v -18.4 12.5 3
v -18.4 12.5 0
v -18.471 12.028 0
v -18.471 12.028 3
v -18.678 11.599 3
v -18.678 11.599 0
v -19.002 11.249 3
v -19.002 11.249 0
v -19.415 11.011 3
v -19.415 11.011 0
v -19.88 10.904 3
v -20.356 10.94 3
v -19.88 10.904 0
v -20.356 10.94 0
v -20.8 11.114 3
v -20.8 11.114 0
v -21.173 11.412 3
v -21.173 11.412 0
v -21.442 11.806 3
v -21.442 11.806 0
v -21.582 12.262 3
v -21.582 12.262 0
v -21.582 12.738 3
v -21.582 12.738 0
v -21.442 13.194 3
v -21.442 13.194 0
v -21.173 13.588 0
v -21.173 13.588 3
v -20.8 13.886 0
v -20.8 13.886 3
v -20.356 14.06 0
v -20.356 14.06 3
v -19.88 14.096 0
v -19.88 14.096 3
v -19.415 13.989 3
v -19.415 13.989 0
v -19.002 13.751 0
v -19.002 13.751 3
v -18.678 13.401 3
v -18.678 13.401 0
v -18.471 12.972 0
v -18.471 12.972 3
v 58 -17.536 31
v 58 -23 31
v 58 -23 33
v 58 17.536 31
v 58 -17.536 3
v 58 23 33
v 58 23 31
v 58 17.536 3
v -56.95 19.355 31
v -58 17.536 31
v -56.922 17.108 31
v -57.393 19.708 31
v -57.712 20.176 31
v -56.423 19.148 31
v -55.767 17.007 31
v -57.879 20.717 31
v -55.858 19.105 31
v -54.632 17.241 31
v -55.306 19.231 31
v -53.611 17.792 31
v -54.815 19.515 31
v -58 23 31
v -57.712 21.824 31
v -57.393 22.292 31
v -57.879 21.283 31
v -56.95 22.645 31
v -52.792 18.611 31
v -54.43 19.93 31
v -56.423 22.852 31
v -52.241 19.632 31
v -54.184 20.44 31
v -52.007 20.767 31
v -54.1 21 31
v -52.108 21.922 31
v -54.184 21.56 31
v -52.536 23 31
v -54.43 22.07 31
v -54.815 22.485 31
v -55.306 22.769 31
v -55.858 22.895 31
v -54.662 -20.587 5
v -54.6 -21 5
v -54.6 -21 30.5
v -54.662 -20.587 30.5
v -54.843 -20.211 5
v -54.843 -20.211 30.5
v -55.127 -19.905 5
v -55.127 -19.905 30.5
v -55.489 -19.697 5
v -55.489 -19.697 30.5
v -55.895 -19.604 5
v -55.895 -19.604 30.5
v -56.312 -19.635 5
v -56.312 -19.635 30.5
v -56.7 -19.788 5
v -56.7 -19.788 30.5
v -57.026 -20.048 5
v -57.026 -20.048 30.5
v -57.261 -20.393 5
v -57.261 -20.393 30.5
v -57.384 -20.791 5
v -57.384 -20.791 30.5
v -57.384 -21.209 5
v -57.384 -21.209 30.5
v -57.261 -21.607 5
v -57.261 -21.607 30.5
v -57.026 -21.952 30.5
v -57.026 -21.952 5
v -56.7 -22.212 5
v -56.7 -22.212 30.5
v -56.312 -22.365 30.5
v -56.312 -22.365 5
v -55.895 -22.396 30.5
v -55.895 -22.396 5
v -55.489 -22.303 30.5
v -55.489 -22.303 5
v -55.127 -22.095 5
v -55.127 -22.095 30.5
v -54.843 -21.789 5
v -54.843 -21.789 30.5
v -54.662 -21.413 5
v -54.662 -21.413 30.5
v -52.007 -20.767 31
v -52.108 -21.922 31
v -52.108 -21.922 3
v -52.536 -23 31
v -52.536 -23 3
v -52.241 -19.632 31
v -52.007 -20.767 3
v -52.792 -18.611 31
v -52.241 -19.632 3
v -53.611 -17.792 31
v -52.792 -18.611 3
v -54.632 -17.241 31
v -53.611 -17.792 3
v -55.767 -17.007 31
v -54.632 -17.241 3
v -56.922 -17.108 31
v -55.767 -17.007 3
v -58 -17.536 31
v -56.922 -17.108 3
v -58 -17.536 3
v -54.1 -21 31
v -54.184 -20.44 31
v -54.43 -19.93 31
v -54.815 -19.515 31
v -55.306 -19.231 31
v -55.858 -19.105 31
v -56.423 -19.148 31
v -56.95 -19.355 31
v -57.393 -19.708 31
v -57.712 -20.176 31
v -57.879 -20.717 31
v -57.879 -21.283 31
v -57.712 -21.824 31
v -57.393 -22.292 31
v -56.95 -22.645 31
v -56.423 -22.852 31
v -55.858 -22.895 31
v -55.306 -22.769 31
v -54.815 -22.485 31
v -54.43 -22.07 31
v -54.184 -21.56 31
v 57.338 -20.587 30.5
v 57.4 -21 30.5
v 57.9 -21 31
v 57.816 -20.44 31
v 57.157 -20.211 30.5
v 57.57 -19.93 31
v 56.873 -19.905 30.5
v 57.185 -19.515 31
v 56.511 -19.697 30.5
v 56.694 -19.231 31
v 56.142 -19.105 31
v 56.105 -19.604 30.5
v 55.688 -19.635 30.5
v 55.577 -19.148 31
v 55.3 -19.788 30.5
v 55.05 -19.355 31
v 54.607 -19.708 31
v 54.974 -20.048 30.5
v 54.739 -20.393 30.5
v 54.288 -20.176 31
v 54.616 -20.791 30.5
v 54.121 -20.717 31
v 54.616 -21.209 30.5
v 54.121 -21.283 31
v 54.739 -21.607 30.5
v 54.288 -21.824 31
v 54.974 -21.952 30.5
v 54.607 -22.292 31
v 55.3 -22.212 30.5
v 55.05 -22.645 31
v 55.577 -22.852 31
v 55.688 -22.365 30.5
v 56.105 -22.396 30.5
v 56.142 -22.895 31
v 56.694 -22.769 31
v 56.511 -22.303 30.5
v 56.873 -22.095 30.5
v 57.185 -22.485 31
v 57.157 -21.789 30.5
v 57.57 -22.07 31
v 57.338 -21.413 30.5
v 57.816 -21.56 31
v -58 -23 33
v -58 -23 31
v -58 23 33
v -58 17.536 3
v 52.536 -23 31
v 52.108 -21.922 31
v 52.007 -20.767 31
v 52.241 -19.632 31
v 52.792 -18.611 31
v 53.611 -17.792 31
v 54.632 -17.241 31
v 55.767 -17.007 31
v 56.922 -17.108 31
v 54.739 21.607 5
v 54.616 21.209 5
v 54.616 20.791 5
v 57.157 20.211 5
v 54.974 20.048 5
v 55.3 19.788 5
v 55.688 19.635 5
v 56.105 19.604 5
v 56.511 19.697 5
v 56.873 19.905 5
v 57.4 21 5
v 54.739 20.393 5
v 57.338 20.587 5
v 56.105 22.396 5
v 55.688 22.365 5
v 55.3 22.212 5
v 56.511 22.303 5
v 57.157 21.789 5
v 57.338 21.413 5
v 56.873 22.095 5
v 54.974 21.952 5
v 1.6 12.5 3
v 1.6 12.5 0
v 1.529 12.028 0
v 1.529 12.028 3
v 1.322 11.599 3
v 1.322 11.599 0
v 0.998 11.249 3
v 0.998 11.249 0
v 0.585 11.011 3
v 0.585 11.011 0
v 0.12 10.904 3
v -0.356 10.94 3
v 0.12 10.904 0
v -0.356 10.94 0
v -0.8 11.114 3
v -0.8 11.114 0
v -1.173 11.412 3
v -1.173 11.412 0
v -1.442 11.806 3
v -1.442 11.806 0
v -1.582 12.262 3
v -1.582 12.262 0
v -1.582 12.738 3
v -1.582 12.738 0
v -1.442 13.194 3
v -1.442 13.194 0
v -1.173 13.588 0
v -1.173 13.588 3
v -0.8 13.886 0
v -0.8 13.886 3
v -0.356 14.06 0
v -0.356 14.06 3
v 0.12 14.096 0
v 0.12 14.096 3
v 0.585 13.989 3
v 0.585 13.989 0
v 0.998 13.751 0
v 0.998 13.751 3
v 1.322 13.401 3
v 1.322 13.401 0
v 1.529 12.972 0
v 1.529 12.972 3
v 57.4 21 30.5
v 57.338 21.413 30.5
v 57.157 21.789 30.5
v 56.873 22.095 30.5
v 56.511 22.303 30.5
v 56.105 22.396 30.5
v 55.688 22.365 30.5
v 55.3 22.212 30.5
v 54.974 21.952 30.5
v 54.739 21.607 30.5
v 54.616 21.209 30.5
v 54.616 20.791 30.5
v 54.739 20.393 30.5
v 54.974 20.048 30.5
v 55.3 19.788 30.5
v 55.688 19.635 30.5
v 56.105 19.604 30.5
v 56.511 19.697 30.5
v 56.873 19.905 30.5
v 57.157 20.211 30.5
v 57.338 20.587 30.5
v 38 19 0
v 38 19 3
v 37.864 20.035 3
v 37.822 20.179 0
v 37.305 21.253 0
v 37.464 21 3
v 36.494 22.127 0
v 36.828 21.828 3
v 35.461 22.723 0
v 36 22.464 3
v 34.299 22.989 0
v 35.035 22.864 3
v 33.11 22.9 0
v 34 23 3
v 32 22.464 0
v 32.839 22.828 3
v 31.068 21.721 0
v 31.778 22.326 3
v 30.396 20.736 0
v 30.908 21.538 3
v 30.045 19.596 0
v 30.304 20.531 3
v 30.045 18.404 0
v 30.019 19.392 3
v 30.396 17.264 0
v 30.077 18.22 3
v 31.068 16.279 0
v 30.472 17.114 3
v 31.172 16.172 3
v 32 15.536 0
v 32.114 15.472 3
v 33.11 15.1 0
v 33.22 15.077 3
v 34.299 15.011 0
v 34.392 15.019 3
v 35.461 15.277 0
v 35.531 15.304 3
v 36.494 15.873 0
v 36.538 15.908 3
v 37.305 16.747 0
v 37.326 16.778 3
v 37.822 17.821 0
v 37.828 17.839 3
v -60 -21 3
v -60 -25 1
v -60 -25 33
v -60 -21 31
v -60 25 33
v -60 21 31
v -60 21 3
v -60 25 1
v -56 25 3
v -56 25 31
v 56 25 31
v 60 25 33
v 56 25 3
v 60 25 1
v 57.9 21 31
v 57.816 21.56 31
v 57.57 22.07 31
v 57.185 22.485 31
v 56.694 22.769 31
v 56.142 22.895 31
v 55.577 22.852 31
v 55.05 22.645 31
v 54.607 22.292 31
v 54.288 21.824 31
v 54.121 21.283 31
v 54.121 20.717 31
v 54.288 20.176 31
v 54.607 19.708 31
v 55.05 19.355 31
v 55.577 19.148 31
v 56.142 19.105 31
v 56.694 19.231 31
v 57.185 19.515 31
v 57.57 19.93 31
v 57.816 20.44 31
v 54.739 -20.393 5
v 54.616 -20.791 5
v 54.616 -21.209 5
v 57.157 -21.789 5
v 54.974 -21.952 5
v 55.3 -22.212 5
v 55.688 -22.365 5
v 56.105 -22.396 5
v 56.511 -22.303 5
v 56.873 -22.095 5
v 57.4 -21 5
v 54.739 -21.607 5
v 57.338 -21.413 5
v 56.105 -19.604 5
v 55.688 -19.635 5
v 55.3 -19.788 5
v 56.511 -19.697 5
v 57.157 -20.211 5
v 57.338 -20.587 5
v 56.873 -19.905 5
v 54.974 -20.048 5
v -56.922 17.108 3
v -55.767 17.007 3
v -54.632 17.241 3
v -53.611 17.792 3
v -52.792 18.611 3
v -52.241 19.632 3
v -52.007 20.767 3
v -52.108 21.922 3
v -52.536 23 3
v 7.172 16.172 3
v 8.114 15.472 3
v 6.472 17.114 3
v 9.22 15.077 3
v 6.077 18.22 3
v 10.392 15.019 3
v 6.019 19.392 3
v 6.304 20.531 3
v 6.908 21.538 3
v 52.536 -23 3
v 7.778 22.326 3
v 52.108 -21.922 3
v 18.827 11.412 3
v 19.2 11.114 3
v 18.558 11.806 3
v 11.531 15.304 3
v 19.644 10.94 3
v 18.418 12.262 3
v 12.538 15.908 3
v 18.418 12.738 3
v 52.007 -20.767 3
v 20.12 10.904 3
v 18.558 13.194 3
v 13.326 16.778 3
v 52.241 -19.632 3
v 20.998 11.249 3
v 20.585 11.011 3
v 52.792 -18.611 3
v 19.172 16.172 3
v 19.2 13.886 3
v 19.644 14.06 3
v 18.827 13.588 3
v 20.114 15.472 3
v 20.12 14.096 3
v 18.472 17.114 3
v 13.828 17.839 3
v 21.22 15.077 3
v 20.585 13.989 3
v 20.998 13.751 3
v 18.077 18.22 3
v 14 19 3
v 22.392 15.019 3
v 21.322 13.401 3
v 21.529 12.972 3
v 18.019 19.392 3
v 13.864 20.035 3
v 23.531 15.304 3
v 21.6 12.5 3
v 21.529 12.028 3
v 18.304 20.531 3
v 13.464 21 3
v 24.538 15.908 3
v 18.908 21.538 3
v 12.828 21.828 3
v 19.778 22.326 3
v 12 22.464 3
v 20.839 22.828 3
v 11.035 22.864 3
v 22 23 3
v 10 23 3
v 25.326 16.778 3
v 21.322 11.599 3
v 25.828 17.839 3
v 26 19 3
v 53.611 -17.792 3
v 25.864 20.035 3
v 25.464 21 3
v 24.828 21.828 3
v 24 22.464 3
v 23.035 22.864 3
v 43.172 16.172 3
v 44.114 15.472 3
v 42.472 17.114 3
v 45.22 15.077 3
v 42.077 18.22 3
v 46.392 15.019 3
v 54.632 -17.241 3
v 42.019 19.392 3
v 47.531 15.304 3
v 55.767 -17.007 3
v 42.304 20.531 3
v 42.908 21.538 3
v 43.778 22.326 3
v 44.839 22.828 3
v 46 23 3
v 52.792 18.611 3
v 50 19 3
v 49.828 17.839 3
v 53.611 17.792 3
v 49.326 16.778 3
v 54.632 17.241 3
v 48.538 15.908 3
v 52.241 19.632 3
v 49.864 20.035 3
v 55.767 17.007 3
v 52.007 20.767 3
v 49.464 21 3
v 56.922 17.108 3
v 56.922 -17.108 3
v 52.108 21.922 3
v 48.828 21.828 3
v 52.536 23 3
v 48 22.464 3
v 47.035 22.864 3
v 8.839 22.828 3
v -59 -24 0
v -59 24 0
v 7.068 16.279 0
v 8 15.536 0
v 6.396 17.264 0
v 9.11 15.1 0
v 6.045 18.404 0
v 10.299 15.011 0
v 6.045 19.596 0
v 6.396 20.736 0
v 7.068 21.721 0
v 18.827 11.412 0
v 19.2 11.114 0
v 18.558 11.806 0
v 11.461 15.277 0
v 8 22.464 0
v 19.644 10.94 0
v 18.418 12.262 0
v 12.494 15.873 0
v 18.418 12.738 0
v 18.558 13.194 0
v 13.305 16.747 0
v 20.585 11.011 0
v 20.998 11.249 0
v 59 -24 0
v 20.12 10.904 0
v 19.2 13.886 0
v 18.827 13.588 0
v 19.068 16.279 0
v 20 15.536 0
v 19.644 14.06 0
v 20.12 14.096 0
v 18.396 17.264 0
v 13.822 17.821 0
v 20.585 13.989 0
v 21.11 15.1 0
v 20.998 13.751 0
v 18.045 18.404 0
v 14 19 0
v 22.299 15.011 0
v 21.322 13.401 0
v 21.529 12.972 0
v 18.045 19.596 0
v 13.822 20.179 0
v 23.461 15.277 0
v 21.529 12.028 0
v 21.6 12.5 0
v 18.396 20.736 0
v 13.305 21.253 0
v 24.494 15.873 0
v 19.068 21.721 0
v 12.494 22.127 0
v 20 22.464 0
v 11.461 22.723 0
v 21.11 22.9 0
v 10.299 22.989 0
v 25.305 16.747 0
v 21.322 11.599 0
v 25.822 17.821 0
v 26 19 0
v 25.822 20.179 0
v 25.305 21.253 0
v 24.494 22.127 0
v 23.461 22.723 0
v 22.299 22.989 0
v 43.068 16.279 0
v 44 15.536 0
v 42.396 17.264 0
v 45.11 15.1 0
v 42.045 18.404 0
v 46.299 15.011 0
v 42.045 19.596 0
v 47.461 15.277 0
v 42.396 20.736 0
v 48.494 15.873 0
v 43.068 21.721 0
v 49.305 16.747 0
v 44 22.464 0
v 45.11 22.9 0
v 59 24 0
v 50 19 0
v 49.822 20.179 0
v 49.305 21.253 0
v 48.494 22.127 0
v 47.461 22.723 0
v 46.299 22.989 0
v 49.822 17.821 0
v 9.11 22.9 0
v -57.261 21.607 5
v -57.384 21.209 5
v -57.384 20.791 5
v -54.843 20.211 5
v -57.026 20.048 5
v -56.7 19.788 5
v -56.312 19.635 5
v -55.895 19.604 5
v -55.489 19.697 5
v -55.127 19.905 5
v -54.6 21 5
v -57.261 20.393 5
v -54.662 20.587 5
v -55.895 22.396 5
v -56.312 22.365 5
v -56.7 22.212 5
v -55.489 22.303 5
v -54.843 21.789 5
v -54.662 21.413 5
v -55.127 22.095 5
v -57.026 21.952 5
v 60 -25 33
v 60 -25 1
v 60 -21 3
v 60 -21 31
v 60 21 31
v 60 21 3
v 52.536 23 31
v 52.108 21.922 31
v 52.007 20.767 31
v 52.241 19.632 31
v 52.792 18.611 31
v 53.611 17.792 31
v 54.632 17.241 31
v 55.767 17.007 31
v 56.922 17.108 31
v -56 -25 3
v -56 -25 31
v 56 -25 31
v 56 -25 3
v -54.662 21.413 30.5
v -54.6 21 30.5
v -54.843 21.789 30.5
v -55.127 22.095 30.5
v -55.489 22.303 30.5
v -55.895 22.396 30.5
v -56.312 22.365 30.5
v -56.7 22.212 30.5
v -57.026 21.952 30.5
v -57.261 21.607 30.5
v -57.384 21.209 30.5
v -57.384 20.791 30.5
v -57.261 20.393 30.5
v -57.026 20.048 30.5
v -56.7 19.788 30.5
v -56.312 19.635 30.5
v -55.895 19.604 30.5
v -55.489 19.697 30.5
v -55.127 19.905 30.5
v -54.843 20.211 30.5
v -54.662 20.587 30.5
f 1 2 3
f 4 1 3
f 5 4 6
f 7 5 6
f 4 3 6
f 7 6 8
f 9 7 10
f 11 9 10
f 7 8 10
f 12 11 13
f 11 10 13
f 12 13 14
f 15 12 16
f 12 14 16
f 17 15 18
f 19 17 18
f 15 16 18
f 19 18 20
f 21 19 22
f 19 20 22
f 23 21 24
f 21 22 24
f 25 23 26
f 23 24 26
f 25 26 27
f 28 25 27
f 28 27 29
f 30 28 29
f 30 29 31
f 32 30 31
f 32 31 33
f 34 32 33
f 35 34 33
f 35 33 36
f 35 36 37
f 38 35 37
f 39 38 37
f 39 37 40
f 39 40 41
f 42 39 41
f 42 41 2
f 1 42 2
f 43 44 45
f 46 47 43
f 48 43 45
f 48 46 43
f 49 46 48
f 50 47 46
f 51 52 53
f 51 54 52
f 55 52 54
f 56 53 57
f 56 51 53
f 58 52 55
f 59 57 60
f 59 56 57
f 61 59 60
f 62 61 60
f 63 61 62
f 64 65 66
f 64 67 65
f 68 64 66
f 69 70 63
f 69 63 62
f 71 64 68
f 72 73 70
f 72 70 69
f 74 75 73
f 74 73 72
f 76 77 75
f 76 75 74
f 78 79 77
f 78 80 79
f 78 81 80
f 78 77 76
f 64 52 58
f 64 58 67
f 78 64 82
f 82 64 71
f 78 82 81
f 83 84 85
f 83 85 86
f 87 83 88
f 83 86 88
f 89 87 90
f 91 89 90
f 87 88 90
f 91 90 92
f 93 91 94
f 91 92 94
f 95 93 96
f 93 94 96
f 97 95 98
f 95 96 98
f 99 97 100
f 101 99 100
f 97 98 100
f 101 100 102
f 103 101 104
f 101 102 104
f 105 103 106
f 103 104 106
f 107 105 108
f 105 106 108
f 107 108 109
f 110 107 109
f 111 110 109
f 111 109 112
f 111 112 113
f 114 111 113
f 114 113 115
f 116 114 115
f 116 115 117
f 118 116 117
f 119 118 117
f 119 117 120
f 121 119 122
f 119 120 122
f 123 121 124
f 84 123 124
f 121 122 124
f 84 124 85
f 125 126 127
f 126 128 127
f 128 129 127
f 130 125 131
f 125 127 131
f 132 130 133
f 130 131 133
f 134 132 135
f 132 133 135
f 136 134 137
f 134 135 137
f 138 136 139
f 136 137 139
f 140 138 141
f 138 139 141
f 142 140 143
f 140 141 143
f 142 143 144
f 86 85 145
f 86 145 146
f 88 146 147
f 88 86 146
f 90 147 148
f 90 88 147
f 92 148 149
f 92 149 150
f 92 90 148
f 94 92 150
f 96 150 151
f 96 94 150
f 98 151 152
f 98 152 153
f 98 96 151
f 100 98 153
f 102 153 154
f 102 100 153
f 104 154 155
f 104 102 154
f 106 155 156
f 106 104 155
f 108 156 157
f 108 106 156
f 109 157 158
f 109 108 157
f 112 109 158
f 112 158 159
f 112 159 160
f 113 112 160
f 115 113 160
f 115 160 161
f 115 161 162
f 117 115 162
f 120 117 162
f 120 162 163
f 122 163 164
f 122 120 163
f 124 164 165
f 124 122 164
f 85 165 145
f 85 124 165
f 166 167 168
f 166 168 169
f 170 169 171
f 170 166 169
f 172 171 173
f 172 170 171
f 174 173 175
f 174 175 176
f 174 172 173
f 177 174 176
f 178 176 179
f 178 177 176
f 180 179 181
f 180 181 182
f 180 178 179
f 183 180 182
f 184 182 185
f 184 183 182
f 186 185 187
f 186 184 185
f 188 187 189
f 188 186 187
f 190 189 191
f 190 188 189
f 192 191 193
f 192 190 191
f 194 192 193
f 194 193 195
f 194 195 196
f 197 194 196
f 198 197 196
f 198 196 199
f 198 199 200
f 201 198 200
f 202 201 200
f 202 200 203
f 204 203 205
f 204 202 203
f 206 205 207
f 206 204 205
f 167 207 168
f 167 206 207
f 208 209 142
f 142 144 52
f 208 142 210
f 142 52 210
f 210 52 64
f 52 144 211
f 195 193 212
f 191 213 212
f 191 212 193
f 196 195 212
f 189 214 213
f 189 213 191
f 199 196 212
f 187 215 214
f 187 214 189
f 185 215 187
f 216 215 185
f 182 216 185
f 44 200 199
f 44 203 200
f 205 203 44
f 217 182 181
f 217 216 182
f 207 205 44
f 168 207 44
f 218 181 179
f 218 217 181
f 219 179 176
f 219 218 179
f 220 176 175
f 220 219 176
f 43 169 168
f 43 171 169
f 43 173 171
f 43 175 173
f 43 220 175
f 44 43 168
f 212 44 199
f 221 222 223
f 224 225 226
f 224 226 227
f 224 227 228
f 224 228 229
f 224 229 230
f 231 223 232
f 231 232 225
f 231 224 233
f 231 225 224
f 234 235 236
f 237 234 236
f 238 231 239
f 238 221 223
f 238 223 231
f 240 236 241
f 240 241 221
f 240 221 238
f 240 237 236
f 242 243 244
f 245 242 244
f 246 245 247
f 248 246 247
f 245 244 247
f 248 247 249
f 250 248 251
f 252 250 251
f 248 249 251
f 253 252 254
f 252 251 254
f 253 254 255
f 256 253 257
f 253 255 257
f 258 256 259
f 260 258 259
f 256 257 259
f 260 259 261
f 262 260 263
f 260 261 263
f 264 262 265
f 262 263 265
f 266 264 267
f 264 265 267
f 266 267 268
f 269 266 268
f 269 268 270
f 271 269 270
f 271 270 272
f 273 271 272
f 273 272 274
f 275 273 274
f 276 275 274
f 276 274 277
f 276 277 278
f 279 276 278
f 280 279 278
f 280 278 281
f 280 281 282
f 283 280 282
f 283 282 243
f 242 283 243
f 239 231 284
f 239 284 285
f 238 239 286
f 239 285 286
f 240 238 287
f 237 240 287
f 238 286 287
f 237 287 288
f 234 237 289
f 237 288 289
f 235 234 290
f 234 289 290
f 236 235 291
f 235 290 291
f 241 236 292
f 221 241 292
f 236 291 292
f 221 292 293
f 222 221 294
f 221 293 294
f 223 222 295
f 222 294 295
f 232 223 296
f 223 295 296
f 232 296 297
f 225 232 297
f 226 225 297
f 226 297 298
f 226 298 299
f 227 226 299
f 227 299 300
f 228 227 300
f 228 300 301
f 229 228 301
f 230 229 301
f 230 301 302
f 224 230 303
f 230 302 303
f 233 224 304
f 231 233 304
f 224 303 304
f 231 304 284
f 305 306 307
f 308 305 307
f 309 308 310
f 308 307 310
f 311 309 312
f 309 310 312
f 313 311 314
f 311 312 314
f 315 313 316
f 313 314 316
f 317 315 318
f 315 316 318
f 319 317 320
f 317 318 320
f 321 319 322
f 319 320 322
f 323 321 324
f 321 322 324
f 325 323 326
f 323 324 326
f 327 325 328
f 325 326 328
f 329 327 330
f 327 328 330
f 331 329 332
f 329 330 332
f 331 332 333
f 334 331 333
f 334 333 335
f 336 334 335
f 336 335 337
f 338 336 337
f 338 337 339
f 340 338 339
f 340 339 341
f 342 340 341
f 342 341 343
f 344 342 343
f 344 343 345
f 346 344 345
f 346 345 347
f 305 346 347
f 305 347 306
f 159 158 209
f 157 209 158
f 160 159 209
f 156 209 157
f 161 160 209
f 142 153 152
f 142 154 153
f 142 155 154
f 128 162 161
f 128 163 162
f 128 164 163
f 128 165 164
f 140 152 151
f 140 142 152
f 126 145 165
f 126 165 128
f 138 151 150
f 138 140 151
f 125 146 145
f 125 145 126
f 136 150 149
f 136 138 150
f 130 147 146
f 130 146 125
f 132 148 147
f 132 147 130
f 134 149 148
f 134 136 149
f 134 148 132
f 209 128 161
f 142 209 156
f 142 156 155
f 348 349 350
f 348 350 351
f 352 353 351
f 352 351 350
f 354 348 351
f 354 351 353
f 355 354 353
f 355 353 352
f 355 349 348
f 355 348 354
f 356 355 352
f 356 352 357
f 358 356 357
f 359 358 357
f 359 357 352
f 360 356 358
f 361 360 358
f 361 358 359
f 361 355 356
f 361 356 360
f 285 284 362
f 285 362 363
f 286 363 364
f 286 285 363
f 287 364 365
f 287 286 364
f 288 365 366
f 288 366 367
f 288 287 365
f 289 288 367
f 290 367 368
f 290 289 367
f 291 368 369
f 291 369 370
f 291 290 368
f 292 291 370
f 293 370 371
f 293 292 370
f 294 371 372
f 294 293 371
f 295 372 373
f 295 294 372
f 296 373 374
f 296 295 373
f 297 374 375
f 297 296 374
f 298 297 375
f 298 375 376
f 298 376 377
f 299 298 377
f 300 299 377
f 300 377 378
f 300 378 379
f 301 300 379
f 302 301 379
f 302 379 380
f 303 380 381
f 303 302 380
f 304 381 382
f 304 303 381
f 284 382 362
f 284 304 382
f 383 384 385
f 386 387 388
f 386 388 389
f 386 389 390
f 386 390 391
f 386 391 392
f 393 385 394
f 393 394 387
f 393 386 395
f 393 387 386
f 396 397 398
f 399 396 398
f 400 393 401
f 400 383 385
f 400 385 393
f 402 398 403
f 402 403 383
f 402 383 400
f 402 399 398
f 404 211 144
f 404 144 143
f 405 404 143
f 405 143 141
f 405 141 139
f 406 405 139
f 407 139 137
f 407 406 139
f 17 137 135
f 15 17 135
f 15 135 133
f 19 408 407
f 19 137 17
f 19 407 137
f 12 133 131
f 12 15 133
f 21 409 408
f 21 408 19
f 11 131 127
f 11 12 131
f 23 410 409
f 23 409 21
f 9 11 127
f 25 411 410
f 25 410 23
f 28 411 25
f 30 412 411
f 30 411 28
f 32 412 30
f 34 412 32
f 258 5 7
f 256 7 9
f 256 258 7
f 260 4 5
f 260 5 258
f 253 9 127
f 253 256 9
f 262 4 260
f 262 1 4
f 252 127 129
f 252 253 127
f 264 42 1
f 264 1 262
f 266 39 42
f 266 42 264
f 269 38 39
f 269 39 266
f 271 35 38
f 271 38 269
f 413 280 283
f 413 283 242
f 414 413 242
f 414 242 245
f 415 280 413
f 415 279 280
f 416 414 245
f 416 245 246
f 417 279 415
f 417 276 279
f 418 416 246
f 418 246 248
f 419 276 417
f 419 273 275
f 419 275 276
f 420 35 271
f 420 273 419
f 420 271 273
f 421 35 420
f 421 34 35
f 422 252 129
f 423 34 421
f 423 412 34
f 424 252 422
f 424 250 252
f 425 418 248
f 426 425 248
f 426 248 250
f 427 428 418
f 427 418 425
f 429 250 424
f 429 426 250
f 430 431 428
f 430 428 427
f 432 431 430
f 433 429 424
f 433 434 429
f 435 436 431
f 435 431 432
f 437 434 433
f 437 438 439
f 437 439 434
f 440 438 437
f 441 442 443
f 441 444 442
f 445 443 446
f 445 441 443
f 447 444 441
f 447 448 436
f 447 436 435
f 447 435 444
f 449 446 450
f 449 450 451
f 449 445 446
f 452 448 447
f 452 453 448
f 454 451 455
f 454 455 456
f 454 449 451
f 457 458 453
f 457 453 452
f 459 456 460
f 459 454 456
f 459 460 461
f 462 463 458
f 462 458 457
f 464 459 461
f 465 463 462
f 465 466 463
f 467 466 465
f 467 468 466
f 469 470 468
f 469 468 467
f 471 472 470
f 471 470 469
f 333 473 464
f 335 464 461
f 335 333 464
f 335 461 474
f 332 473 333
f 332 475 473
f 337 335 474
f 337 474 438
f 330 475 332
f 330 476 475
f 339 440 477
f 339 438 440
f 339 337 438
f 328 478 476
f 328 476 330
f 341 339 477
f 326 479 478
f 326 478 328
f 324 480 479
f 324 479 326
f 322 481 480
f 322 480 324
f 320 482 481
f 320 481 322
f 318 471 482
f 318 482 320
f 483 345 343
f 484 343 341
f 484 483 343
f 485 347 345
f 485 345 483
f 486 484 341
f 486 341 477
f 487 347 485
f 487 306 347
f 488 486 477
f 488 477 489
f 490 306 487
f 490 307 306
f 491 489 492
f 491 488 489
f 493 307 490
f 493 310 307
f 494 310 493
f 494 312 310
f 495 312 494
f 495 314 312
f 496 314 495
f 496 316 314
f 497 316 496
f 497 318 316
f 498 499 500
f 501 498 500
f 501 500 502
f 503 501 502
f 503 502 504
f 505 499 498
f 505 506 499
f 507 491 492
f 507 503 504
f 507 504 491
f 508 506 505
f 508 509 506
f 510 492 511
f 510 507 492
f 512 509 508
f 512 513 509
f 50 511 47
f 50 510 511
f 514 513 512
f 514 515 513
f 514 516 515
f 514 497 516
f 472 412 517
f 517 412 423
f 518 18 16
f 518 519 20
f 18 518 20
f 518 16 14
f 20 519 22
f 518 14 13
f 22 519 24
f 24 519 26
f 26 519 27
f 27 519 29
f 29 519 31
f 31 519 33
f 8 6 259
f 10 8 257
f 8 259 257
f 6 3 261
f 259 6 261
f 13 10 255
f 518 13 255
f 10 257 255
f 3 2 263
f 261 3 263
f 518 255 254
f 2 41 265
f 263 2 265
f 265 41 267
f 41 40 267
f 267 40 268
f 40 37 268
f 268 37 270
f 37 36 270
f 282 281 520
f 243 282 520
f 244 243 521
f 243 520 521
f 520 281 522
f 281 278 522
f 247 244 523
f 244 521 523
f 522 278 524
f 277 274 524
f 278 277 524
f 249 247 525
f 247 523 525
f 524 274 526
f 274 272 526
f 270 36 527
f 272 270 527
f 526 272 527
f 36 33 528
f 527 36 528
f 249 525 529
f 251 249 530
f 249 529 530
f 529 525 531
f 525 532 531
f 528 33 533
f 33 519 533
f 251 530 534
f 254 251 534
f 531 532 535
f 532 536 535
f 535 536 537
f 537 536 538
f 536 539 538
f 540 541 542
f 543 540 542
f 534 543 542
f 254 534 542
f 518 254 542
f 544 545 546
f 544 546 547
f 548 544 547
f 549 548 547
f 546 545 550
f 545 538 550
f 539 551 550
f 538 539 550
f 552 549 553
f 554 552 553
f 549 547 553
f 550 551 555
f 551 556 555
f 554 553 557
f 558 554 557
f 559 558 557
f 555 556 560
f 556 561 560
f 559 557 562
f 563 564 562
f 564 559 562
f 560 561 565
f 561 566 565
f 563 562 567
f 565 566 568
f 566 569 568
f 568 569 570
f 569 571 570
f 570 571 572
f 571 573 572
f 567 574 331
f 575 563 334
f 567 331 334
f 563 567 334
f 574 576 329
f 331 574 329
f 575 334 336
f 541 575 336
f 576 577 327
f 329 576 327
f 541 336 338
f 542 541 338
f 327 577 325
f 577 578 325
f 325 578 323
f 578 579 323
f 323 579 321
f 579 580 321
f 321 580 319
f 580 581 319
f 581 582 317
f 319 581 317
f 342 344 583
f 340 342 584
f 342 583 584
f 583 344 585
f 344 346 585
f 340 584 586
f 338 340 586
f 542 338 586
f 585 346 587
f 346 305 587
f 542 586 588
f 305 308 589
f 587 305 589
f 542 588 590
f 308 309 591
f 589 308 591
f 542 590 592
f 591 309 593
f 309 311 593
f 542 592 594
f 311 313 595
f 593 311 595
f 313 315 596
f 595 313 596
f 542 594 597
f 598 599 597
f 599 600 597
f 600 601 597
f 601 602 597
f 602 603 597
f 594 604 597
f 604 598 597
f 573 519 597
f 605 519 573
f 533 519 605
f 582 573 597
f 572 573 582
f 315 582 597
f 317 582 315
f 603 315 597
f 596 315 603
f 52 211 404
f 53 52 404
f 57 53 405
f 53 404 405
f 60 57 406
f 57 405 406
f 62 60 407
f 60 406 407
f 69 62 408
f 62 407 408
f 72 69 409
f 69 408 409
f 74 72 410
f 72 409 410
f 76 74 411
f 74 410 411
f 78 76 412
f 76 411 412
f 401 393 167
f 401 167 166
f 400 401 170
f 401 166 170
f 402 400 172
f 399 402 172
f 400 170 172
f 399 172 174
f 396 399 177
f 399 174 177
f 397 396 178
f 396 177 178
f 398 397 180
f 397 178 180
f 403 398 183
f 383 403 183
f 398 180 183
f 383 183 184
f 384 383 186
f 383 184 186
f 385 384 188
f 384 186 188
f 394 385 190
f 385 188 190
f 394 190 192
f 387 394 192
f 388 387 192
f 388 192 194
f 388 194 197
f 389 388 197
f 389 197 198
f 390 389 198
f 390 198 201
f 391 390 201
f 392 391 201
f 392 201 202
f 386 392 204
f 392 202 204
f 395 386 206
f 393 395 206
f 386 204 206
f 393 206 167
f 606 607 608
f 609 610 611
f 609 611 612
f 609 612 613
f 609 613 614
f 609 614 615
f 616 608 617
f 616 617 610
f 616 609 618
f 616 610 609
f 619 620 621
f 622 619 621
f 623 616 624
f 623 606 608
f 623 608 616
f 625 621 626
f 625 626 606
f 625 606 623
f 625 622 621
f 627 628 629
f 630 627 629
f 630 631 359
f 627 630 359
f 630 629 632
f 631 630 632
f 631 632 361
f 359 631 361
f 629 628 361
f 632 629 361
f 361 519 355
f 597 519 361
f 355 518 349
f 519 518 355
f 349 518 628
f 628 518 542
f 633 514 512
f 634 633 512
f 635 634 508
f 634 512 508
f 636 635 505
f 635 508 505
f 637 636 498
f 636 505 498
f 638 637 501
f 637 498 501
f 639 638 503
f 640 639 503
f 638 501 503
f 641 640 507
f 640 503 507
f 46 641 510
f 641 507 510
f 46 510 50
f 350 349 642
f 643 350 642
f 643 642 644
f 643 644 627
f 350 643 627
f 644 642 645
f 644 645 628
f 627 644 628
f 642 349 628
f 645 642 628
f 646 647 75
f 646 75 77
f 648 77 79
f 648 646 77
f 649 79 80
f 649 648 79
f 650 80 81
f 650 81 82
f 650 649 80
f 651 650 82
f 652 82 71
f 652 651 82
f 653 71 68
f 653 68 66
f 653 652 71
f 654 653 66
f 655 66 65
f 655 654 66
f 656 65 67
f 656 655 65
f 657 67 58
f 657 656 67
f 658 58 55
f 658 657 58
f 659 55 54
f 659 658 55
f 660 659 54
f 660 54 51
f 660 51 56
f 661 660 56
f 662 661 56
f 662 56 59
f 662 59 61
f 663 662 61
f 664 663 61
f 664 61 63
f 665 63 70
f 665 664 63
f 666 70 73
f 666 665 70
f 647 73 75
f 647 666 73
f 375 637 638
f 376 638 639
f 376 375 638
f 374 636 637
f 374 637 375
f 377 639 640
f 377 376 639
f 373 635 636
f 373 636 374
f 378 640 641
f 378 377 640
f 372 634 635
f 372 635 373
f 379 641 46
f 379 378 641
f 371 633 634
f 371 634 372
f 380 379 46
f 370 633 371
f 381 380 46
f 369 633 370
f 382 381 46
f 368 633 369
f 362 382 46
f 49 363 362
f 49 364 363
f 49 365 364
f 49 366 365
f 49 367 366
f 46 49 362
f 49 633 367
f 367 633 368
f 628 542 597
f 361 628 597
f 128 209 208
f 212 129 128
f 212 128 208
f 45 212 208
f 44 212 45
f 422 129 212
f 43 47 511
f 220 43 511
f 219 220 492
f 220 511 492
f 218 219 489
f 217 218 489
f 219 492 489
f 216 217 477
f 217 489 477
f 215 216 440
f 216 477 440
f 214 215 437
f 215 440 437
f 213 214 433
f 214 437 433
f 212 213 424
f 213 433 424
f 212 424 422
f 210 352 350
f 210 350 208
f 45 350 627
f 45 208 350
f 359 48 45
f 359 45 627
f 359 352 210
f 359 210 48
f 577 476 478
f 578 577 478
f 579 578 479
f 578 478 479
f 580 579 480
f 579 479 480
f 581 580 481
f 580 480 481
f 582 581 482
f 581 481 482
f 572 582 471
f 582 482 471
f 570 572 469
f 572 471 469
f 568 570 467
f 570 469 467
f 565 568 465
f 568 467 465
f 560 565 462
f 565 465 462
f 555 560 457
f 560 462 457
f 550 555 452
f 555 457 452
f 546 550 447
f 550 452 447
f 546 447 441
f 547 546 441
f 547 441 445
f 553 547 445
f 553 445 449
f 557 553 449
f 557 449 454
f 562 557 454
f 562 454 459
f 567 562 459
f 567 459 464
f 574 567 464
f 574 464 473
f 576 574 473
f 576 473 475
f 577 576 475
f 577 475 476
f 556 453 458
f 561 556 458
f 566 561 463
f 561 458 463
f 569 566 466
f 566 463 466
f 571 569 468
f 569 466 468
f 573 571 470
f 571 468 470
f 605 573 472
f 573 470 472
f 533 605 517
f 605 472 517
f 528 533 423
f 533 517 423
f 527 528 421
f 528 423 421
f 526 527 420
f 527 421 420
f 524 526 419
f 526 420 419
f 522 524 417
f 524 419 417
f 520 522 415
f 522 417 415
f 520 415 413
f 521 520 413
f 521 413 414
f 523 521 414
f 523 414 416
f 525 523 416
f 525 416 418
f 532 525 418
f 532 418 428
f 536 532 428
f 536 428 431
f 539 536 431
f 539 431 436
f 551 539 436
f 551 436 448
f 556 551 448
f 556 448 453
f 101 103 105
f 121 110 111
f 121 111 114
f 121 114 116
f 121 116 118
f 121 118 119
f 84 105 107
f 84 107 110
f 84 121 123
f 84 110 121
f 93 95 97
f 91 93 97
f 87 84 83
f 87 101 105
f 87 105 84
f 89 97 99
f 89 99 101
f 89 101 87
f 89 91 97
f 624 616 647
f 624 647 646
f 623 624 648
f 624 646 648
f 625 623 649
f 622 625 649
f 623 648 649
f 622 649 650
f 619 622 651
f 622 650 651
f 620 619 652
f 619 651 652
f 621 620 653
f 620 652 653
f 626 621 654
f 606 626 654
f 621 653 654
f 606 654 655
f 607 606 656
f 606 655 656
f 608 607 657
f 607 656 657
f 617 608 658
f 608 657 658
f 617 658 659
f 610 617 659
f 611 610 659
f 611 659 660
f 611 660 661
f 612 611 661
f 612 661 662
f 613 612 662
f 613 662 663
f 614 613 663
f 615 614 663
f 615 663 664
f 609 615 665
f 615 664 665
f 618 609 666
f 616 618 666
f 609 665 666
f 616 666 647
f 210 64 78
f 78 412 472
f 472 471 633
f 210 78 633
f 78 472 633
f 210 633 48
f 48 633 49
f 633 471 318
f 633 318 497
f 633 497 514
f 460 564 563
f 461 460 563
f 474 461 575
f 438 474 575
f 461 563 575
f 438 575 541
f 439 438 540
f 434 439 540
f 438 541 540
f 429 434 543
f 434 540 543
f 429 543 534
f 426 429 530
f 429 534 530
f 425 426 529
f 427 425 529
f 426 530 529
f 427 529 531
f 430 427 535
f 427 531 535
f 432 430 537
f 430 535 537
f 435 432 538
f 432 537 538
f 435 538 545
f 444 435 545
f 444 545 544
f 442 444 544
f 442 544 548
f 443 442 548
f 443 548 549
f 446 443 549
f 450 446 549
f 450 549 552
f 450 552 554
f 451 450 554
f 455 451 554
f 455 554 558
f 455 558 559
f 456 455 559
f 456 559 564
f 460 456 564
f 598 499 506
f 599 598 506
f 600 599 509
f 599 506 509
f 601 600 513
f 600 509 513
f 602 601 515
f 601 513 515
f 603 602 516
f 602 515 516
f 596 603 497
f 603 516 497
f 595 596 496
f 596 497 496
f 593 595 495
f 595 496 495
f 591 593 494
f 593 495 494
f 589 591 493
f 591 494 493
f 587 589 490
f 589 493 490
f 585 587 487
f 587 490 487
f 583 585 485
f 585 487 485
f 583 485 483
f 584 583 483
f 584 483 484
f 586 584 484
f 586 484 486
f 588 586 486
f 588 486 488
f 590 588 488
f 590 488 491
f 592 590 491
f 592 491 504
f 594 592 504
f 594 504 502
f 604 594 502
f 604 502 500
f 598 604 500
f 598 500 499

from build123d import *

# Parameters (mm, degrees)
SKETCH_W        = 120
SKETCH_H        = 50
PAD_DEPTH       = 3
SKETCH001_R     = 4
POCKET_DEPTH    = 5
SKETCH002_W     = 120
SKETCH002_H     = 50
SKETCH002_W_2   = 116
SKETCH002_H_2   = 46
PAD001_DEPTH    = 30
SKETCH003_R     = 1.6
POCKET001_DEPTH = 5
SKETCH004_R     = 4
PAD002_DEPTH    = 28
SKETCH005_R     = 1.4
POCKET002_DEPTH = 26
CHAMFER_SIZE    = 0.5
CHAMFER001_SIZE = 1


with BuildPart() as part:
    # Sketch → Pad (new body)
    with BuildSketch(Plane.XY):
        Rectangle(SKETCH_W, SKETCH_H)
    extrude(amount=PAD_DEPTH)

    # Sketch001 (on Face6 of Pad) → Pocket (cut)
    with BuildSketch(Plane.XY.offset(3)):
        with Locations((10, 19)):
            Circle(SKETCH001_R)
        with Locations((22, 19)):
            Circle(SKETCH001_R)
        with Locations((34, 19)):
            Circle(SKETCH001_R)
        with Locations((46, 19)):
            Circle(SKETCH001_R)
    extrude(amount=-POCKET_DEPTH, mode=Mode.SUBTRACT)

    # Sketch002 (on Face5 of Pocket) → Pad001 (join)
    with BuildSketch(Plane.XY.offset(3)):
        Rectangle(SKETCH002_W, SKETCH002_H)
        Rectangle(SKETCH002_W_2, SKETCH002_H_2, mode=Mode.SUBTRACT)
    extrude(amount=PAD001_DEPTH)

    # Sketch003 (on Face4 of Pad001) → Pocket001 (cut)
    with BuildSketch(Plane(origin=(0, 0, 0), x_dir=(1, 0, 0), z_dir=(0, 0, -1))):
        with Locations((-20, -12.5)):
            Circle(SKETCH003_R)
        with Locations((0, -12.5)):
            Circle(SKETCH003_R)
        with Locations((20, -12.5)):
            Circle(SKETCH003_R)
    extrude(amount=-POCKET001_DEPTH, mode=Mode.SUBTRACT)

    # Sketch004 (on Face18 of Pocket001) → Pad002 (join)
    with BuildSketch(Plane.XY.offset(3)):
        with Locations((-56, 21)):
            Circle(SKETCH004_R)
        with Locations((-56, -21)):
            Circle(SKETCH004_R)
        with Locations((56, 21)):
            Circle(SKETCH004_R)
        with Locations((56, -21)):
            Circle(SKETCH004_R)
    extrude(amount=PAD002_DEPTH)

    # Sketch005 (on Face29 of Pad002) → Pocket002 (cut)
    with BuildSketch(Plane.XY.offset(31)):
        with Locations((-56, 21)):
            Circle(SKETCH005_R)
        with Locations((56, 21)):
            Circle(SKETCH005_R)
        with Locations((56, -21)):
            Circle(SKETCH005_R)
        with Locations((-56, -21)):
            Circle(SKETCH005_R)
    extrude(amount=-POCKET002_DEPTH, mode=Mode.SUBTRACT)

    # Chamfer
    chamfer_edges = [part.edges().sort_by_distance(p)[0] for p in [
        (54.6, 21, 31),
        (54.6, -21, 31),
        (-57.4, -21, 31),
        (-57.4, 21, 31),
    ]]
    chamfer(chamfer_edges, length=CHAMFER_SIZE)

    # Chamfer001
    chamfer001_edges = [part.edges().sort_by_distance(p)[0] for p in [
        (0, 25, 0),
        (-60, 0, 0),
        (0, -25, 0),
        (60, 0, 0),
    ]]
    chamfer(chamfer001_edges, length=CHAMFER001_SIZE)


solid = part.part
